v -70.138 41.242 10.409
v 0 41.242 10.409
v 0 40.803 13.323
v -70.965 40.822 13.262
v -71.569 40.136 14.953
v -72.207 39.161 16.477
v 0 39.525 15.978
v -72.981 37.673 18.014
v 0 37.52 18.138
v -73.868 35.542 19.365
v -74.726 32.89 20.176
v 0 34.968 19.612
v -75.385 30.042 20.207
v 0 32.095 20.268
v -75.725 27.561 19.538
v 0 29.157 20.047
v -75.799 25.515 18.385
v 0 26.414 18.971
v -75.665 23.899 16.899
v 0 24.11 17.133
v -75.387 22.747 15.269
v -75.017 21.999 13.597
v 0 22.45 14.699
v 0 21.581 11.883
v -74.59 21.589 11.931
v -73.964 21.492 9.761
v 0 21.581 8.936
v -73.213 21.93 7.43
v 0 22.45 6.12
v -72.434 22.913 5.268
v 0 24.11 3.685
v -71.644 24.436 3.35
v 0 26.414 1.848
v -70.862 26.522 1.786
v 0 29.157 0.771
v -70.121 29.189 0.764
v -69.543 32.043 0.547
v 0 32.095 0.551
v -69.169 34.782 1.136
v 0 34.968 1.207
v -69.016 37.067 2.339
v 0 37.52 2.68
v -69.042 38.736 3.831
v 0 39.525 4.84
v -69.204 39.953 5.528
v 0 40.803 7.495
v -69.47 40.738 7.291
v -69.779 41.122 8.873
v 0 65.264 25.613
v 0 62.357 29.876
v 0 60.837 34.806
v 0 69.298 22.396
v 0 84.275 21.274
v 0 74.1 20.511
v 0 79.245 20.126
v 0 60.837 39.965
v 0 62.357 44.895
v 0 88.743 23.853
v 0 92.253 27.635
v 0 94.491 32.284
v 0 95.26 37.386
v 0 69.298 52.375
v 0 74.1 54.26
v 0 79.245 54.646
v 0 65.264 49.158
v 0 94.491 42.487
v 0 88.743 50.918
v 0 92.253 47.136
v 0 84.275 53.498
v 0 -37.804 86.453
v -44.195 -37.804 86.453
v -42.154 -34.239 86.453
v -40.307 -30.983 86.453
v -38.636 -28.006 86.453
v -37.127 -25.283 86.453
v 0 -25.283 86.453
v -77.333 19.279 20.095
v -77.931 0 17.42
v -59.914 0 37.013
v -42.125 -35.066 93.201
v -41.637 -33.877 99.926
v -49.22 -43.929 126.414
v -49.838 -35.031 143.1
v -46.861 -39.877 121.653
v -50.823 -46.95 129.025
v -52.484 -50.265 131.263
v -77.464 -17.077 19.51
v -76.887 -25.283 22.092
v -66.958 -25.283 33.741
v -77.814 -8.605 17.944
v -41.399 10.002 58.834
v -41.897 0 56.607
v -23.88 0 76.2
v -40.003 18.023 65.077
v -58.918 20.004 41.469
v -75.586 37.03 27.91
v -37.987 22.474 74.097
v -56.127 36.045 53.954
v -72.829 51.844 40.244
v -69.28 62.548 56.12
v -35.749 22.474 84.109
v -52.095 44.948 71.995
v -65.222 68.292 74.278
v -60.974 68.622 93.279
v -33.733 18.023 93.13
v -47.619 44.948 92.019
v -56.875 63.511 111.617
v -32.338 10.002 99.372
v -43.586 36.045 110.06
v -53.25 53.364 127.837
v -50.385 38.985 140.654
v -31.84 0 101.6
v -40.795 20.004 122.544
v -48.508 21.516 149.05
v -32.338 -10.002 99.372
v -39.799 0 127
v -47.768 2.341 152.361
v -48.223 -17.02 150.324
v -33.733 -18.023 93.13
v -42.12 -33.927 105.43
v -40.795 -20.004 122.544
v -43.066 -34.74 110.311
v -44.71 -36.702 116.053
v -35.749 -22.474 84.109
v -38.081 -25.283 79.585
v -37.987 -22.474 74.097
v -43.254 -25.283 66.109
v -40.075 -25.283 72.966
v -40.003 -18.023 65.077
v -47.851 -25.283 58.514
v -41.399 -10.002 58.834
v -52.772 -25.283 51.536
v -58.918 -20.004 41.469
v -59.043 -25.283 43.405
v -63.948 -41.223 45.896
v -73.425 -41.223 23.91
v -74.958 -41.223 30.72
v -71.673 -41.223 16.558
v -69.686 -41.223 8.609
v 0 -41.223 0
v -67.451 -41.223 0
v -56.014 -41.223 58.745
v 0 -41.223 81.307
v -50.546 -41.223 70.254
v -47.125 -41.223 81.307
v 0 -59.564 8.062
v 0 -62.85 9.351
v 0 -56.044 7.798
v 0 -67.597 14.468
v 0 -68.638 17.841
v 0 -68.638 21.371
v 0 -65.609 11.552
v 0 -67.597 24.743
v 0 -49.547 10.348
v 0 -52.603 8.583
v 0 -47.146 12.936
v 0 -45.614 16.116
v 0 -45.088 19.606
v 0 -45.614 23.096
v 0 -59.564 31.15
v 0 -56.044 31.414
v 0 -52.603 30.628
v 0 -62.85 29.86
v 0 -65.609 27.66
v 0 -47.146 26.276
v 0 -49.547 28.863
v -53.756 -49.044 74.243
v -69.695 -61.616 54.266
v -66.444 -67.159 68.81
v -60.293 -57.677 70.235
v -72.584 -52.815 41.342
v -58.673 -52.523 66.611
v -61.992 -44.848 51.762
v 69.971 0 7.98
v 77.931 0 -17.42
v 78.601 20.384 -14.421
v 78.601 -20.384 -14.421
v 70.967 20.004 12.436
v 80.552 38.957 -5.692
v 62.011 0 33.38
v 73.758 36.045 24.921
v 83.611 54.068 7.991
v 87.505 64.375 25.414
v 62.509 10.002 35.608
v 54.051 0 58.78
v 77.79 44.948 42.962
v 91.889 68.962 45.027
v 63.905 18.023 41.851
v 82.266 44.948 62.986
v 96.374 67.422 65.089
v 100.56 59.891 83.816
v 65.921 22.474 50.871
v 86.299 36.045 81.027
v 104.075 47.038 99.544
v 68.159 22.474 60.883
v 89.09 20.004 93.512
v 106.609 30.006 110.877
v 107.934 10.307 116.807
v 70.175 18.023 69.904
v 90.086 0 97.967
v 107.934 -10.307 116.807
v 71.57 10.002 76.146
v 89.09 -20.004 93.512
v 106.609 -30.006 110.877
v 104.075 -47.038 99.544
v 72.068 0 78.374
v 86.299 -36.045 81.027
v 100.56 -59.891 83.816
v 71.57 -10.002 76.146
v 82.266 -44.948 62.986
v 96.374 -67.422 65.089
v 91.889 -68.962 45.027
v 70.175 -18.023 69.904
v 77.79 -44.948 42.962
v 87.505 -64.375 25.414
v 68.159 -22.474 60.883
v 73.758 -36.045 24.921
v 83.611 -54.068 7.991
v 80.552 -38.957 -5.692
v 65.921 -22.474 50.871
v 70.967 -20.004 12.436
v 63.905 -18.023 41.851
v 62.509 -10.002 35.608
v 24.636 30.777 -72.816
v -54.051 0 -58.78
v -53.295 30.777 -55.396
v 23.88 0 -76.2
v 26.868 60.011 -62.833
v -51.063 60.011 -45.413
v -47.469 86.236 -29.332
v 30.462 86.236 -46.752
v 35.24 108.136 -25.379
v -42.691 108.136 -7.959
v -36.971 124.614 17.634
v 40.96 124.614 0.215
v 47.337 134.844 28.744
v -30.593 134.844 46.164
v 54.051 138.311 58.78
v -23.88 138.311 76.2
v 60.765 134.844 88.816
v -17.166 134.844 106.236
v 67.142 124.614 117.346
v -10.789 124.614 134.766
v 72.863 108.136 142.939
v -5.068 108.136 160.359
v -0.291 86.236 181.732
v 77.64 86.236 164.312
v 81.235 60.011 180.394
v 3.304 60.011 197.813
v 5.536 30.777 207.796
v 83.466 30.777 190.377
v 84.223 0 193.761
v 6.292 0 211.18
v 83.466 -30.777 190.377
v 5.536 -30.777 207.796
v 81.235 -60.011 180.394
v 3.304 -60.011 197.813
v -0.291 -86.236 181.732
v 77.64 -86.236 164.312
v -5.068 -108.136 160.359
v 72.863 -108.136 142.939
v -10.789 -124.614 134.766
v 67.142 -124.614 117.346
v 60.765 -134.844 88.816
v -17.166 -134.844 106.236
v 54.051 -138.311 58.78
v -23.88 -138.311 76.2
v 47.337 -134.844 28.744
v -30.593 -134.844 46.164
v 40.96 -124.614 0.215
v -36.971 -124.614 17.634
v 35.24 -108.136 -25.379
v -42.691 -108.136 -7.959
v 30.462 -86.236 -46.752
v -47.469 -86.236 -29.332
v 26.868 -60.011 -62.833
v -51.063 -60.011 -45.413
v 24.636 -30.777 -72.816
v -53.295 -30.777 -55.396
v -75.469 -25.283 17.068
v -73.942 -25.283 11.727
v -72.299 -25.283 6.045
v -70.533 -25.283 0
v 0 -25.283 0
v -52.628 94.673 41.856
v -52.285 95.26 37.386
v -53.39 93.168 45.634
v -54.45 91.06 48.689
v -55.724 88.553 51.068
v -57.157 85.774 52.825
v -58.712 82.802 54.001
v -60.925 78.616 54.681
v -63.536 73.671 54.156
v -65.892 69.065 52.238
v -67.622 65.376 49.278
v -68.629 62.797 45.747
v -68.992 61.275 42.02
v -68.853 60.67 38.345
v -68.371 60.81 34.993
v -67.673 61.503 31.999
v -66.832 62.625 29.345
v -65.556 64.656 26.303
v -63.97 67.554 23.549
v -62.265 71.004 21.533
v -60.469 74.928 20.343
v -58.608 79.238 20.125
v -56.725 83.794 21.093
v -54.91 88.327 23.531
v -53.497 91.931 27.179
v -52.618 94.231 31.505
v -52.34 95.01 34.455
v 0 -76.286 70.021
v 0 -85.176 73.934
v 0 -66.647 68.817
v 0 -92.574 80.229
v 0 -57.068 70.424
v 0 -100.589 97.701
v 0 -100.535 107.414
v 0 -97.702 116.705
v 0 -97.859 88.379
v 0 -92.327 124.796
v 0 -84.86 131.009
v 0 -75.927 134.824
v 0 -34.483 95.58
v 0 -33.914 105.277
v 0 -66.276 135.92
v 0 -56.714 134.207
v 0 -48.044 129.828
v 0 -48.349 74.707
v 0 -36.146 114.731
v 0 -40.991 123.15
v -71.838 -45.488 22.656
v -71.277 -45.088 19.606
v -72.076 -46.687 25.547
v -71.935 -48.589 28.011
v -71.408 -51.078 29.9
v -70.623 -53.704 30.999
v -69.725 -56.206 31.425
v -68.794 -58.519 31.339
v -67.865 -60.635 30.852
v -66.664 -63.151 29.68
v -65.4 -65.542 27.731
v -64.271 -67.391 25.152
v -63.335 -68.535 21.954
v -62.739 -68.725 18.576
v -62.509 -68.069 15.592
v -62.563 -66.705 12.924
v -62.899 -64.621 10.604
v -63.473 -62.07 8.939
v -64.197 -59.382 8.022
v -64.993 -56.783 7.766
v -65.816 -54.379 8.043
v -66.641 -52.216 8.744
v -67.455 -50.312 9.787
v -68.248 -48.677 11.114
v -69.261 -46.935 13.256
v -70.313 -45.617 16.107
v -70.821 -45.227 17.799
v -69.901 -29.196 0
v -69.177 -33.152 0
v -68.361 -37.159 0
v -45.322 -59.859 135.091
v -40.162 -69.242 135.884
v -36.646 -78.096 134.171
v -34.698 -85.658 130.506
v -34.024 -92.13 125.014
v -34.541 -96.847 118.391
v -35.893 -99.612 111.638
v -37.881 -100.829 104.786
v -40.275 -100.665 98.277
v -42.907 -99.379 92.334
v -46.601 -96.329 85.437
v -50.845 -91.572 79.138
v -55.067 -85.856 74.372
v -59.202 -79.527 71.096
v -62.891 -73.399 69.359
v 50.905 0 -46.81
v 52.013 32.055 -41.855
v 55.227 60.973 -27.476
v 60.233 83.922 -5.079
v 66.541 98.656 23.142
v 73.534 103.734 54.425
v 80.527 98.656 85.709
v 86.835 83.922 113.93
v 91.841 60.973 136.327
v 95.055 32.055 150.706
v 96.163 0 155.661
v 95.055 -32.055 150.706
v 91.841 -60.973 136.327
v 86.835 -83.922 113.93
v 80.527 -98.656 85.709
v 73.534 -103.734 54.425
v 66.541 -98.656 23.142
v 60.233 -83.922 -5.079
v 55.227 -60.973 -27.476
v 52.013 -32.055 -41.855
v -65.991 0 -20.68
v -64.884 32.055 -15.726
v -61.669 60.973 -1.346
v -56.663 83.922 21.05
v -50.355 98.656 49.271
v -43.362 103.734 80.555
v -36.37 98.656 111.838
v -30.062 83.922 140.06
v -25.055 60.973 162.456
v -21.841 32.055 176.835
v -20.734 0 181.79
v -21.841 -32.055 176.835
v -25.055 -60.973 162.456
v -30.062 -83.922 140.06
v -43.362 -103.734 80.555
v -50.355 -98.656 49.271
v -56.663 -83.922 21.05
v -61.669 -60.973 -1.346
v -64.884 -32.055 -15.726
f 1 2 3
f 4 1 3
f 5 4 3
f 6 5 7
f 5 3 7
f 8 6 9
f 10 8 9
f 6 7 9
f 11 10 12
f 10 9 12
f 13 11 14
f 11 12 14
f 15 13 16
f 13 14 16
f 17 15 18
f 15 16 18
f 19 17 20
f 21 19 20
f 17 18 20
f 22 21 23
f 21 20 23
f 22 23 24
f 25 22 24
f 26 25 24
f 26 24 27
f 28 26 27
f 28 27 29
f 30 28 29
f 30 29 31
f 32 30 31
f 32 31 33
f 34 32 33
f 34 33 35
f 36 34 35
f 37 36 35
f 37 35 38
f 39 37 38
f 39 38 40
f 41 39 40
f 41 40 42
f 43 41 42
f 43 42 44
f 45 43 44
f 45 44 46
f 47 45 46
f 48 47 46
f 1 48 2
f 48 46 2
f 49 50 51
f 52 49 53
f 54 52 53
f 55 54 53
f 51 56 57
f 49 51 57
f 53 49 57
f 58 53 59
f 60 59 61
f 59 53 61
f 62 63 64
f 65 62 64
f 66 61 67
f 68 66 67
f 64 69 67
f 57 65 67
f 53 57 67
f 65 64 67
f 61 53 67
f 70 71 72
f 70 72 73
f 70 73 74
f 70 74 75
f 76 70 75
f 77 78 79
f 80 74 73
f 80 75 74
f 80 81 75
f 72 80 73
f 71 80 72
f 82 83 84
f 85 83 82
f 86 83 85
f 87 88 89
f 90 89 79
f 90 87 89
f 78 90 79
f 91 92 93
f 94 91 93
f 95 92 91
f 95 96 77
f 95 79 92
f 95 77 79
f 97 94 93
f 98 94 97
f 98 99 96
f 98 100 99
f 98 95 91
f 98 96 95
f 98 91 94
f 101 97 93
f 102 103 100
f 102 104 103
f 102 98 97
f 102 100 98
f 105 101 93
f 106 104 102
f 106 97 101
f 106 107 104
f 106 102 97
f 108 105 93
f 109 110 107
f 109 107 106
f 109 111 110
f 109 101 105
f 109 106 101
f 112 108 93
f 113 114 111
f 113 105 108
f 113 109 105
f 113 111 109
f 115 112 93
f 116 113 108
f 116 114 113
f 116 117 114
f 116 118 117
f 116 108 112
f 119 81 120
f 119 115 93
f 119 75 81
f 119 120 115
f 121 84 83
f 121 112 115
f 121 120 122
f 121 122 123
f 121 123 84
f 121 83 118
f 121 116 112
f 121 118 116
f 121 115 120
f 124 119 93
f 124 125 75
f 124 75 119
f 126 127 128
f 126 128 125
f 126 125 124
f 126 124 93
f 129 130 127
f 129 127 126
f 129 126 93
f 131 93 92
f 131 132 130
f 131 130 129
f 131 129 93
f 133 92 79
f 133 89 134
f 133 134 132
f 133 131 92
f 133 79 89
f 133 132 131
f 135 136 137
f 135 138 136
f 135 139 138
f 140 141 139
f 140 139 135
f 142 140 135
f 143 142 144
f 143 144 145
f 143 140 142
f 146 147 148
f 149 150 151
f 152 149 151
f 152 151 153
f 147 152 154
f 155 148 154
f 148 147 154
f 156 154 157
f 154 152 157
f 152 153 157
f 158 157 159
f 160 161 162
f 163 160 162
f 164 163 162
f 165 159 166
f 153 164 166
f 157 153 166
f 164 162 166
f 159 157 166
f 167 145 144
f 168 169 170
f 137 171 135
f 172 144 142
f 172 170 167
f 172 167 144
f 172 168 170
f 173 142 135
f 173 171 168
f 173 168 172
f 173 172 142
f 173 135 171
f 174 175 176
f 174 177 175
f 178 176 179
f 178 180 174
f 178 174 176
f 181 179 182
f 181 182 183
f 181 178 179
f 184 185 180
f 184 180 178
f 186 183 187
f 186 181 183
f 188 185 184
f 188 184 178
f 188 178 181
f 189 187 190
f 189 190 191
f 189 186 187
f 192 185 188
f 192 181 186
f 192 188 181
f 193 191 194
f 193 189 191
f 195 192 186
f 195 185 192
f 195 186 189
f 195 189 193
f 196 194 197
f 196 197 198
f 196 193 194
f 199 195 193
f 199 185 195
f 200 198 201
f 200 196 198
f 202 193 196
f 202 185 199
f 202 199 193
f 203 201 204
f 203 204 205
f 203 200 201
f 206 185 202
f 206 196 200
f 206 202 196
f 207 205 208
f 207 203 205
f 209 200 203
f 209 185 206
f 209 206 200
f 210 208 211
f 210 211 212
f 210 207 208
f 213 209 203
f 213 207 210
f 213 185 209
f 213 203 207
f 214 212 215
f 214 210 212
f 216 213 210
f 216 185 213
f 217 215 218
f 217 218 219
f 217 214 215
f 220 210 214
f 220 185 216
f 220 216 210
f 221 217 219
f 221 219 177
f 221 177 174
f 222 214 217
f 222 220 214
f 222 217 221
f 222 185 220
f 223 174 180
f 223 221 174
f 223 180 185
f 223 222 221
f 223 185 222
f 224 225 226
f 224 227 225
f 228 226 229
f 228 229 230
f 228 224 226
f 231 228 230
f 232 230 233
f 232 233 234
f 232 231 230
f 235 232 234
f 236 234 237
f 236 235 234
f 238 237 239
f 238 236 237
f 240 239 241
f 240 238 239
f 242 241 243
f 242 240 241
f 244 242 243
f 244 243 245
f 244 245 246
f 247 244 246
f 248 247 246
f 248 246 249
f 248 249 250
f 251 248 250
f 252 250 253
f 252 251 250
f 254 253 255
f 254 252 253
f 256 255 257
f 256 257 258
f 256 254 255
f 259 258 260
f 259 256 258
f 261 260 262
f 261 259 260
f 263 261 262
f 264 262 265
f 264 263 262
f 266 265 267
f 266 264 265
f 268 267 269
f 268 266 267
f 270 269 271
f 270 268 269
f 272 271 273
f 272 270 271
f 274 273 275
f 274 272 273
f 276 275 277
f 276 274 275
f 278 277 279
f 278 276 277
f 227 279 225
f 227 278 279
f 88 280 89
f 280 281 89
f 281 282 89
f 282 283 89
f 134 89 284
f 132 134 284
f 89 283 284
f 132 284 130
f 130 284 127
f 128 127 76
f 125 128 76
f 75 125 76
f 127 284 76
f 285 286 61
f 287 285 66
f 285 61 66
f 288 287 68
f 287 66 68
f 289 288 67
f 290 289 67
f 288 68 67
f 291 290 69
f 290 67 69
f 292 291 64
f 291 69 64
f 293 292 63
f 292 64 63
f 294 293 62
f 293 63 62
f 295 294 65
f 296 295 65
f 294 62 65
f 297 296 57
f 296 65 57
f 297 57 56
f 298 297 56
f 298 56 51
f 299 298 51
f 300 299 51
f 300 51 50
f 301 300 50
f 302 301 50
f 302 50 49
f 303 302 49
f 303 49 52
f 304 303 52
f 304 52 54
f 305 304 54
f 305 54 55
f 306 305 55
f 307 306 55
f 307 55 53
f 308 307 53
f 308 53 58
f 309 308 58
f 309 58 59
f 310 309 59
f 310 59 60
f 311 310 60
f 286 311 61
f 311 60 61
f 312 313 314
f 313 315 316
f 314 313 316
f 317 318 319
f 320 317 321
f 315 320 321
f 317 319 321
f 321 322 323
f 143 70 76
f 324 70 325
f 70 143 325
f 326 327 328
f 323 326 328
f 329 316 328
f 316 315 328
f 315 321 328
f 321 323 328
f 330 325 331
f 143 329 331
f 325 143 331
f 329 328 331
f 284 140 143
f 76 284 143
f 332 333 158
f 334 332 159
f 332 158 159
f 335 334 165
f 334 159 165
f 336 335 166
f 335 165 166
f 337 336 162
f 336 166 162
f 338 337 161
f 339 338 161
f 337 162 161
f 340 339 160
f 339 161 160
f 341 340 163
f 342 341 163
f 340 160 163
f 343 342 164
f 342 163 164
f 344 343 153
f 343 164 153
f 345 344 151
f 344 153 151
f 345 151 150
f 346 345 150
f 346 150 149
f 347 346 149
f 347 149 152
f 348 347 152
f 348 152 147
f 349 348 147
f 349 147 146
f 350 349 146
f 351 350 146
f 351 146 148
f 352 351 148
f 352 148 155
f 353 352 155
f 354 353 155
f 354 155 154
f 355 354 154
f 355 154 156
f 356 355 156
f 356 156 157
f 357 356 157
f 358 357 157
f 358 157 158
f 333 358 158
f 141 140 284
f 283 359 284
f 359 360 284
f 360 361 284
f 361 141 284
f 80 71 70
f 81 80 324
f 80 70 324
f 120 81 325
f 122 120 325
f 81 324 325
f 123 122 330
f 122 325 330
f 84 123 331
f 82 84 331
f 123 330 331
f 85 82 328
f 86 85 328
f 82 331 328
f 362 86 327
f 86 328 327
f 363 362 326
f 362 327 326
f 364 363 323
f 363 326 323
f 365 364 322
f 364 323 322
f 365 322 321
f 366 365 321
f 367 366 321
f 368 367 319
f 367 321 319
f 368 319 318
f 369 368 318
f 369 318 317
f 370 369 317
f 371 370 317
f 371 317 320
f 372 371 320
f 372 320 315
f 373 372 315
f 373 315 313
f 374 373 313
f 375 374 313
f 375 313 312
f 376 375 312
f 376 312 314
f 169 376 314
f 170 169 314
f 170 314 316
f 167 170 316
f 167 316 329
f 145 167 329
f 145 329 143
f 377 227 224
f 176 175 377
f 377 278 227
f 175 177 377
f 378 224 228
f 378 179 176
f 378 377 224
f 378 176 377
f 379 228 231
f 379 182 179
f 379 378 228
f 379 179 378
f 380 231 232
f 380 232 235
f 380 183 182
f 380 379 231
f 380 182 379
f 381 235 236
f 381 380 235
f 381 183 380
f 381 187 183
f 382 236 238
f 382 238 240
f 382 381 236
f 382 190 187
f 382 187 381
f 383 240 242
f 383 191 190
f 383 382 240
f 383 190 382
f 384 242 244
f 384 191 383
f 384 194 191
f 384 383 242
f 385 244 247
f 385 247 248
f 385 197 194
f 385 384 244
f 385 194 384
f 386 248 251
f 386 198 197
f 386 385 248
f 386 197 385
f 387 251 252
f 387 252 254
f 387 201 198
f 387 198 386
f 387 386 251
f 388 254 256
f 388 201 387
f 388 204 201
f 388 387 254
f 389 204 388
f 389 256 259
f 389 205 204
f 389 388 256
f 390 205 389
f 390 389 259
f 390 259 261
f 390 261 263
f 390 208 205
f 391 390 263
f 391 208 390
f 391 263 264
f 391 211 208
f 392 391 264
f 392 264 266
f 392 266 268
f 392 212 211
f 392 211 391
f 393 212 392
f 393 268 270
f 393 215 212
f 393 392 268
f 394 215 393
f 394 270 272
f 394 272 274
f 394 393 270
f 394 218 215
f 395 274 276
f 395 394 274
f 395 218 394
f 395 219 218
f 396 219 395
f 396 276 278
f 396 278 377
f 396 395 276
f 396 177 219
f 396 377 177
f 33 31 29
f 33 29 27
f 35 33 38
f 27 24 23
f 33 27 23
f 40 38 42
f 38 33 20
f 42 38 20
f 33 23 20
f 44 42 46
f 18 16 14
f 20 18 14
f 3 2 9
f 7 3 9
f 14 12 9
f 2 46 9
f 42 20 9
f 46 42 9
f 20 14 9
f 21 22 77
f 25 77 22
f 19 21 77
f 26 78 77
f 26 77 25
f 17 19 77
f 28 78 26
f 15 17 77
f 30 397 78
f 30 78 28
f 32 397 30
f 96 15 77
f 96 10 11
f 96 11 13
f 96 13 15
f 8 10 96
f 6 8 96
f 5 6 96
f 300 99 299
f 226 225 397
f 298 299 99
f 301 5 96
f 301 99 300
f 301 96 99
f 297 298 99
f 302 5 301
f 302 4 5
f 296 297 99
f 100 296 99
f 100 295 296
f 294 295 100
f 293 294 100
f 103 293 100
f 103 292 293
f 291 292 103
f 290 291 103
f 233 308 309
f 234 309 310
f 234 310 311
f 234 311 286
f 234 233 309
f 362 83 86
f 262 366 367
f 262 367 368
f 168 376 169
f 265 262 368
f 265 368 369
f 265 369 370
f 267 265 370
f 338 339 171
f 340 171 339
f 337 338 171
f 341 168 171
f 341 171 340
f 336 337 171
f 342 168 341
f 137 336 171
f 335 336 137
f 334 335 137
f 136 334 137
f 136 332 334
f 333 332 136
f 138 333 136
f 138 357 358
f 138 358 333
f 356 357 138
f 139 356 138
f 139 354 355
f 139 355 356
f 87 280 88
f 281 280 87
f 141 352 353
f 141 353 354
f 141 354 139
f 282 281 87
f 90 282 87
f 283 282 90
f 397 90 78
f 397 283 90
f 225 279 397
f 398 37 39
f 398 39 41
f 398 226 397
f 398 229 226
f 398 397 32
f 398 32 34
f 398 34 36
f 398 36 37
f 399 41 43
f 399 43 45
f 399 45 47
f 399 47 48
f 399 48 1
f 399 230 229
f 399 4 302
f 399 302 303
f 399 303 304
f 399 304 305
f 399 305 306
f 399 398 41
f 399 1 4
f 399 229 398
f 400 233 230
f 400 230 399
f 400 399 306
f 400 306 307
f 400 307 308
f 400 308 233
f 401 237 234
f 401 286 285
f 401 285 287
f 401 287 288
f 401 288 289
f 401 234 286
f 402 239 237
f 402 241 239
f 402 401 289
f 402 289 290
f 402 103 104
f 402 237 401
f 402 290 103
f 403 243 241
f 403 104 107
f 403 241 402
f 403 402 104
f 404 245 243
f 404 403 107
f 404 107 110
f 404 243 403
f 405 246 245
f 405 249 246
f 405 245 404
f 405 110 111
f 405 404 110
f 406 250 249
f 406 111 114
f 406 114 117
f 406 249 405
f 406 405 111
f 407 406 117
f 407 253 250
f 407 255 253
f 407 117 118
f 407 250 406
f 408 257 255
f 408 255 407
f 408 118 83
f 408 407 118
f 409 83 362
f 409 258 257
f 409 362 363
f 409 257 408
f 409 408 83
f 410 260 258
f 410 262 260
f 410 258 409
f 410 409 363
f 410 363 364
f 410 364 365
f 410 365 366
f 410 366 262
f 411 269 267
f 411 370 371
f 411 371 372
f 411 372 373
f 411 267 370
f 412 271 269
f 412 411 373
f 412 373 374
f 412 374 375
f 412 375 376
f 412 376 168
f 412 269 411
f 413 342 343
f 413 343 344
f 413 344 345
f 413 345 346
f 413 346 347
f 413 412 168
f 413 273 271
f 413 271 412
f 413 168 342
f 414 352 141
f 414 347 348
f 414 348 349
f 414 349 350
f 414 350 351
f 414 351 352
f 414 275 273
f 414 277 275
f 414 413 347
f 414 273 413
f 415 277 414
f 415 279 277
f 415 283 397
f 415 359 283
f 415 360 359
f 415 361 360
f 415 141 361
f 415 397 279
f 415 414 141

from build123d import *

# Parameters (mm, degrees)
F2_R     = 17.3084147979
F2_R_2   = 9.8858681408
F2_R_3   = 11.8408403521
F2_R_4   = 33.563848705
F3_DEPTH = 77.9319693274
F4_W     = 15.939405188
F4_H     = 86.4525958896
F5_DEPTH = 77.9319694274


with BuildPart() as f1:
    # F0 (on Front) → F1 (revolve)
    with BuildSketch(Plane.XZ):
        Polygon((23.8796671181, -76.2), (77.9309693274, -17.4196016418), (54.0513022093, 58.7803983582), (-23.8796671181, 76.2), (-77.9309693274, 17.4196016418), (-54.0513022093, -58.7803983582), align=None)
    revolve(axis=Axis((15.0858175456, 0, 67.4901991791), (0.9759168522, 0, -0.2181428378)))

    # F2 (on Right) → F3 (cut, through all)
    with BuildSketch(Plane.YZ):
        with Locations((77.9518336058, 37.3855829239)):
            Circle(F2_R)
        with Locations((31.3565693796, 10.4093803093)):
            Circle(F2_R_2)
        with Locations((-56.9291785359, 19.605813548)):
            Circle(F2_R_3)
        with Locations((-67.351795733, 102.3737117648)):
            Circle(F2_R_4)
    extrude(amount=-F3_DEPTH, mode=Mode.SUBTRACT)

    # F4 (on Right) → F5 (cut, through all)
    with BuildSketch(Plane.YZ):
        with Locations((-33.2528958097, 43.2262979448)):
            Rectangle(F4_W, F4_H)
    extrude(amount=-F5_DEPTH, mode=Mode.SUBTRACT)


solid = f1.part
